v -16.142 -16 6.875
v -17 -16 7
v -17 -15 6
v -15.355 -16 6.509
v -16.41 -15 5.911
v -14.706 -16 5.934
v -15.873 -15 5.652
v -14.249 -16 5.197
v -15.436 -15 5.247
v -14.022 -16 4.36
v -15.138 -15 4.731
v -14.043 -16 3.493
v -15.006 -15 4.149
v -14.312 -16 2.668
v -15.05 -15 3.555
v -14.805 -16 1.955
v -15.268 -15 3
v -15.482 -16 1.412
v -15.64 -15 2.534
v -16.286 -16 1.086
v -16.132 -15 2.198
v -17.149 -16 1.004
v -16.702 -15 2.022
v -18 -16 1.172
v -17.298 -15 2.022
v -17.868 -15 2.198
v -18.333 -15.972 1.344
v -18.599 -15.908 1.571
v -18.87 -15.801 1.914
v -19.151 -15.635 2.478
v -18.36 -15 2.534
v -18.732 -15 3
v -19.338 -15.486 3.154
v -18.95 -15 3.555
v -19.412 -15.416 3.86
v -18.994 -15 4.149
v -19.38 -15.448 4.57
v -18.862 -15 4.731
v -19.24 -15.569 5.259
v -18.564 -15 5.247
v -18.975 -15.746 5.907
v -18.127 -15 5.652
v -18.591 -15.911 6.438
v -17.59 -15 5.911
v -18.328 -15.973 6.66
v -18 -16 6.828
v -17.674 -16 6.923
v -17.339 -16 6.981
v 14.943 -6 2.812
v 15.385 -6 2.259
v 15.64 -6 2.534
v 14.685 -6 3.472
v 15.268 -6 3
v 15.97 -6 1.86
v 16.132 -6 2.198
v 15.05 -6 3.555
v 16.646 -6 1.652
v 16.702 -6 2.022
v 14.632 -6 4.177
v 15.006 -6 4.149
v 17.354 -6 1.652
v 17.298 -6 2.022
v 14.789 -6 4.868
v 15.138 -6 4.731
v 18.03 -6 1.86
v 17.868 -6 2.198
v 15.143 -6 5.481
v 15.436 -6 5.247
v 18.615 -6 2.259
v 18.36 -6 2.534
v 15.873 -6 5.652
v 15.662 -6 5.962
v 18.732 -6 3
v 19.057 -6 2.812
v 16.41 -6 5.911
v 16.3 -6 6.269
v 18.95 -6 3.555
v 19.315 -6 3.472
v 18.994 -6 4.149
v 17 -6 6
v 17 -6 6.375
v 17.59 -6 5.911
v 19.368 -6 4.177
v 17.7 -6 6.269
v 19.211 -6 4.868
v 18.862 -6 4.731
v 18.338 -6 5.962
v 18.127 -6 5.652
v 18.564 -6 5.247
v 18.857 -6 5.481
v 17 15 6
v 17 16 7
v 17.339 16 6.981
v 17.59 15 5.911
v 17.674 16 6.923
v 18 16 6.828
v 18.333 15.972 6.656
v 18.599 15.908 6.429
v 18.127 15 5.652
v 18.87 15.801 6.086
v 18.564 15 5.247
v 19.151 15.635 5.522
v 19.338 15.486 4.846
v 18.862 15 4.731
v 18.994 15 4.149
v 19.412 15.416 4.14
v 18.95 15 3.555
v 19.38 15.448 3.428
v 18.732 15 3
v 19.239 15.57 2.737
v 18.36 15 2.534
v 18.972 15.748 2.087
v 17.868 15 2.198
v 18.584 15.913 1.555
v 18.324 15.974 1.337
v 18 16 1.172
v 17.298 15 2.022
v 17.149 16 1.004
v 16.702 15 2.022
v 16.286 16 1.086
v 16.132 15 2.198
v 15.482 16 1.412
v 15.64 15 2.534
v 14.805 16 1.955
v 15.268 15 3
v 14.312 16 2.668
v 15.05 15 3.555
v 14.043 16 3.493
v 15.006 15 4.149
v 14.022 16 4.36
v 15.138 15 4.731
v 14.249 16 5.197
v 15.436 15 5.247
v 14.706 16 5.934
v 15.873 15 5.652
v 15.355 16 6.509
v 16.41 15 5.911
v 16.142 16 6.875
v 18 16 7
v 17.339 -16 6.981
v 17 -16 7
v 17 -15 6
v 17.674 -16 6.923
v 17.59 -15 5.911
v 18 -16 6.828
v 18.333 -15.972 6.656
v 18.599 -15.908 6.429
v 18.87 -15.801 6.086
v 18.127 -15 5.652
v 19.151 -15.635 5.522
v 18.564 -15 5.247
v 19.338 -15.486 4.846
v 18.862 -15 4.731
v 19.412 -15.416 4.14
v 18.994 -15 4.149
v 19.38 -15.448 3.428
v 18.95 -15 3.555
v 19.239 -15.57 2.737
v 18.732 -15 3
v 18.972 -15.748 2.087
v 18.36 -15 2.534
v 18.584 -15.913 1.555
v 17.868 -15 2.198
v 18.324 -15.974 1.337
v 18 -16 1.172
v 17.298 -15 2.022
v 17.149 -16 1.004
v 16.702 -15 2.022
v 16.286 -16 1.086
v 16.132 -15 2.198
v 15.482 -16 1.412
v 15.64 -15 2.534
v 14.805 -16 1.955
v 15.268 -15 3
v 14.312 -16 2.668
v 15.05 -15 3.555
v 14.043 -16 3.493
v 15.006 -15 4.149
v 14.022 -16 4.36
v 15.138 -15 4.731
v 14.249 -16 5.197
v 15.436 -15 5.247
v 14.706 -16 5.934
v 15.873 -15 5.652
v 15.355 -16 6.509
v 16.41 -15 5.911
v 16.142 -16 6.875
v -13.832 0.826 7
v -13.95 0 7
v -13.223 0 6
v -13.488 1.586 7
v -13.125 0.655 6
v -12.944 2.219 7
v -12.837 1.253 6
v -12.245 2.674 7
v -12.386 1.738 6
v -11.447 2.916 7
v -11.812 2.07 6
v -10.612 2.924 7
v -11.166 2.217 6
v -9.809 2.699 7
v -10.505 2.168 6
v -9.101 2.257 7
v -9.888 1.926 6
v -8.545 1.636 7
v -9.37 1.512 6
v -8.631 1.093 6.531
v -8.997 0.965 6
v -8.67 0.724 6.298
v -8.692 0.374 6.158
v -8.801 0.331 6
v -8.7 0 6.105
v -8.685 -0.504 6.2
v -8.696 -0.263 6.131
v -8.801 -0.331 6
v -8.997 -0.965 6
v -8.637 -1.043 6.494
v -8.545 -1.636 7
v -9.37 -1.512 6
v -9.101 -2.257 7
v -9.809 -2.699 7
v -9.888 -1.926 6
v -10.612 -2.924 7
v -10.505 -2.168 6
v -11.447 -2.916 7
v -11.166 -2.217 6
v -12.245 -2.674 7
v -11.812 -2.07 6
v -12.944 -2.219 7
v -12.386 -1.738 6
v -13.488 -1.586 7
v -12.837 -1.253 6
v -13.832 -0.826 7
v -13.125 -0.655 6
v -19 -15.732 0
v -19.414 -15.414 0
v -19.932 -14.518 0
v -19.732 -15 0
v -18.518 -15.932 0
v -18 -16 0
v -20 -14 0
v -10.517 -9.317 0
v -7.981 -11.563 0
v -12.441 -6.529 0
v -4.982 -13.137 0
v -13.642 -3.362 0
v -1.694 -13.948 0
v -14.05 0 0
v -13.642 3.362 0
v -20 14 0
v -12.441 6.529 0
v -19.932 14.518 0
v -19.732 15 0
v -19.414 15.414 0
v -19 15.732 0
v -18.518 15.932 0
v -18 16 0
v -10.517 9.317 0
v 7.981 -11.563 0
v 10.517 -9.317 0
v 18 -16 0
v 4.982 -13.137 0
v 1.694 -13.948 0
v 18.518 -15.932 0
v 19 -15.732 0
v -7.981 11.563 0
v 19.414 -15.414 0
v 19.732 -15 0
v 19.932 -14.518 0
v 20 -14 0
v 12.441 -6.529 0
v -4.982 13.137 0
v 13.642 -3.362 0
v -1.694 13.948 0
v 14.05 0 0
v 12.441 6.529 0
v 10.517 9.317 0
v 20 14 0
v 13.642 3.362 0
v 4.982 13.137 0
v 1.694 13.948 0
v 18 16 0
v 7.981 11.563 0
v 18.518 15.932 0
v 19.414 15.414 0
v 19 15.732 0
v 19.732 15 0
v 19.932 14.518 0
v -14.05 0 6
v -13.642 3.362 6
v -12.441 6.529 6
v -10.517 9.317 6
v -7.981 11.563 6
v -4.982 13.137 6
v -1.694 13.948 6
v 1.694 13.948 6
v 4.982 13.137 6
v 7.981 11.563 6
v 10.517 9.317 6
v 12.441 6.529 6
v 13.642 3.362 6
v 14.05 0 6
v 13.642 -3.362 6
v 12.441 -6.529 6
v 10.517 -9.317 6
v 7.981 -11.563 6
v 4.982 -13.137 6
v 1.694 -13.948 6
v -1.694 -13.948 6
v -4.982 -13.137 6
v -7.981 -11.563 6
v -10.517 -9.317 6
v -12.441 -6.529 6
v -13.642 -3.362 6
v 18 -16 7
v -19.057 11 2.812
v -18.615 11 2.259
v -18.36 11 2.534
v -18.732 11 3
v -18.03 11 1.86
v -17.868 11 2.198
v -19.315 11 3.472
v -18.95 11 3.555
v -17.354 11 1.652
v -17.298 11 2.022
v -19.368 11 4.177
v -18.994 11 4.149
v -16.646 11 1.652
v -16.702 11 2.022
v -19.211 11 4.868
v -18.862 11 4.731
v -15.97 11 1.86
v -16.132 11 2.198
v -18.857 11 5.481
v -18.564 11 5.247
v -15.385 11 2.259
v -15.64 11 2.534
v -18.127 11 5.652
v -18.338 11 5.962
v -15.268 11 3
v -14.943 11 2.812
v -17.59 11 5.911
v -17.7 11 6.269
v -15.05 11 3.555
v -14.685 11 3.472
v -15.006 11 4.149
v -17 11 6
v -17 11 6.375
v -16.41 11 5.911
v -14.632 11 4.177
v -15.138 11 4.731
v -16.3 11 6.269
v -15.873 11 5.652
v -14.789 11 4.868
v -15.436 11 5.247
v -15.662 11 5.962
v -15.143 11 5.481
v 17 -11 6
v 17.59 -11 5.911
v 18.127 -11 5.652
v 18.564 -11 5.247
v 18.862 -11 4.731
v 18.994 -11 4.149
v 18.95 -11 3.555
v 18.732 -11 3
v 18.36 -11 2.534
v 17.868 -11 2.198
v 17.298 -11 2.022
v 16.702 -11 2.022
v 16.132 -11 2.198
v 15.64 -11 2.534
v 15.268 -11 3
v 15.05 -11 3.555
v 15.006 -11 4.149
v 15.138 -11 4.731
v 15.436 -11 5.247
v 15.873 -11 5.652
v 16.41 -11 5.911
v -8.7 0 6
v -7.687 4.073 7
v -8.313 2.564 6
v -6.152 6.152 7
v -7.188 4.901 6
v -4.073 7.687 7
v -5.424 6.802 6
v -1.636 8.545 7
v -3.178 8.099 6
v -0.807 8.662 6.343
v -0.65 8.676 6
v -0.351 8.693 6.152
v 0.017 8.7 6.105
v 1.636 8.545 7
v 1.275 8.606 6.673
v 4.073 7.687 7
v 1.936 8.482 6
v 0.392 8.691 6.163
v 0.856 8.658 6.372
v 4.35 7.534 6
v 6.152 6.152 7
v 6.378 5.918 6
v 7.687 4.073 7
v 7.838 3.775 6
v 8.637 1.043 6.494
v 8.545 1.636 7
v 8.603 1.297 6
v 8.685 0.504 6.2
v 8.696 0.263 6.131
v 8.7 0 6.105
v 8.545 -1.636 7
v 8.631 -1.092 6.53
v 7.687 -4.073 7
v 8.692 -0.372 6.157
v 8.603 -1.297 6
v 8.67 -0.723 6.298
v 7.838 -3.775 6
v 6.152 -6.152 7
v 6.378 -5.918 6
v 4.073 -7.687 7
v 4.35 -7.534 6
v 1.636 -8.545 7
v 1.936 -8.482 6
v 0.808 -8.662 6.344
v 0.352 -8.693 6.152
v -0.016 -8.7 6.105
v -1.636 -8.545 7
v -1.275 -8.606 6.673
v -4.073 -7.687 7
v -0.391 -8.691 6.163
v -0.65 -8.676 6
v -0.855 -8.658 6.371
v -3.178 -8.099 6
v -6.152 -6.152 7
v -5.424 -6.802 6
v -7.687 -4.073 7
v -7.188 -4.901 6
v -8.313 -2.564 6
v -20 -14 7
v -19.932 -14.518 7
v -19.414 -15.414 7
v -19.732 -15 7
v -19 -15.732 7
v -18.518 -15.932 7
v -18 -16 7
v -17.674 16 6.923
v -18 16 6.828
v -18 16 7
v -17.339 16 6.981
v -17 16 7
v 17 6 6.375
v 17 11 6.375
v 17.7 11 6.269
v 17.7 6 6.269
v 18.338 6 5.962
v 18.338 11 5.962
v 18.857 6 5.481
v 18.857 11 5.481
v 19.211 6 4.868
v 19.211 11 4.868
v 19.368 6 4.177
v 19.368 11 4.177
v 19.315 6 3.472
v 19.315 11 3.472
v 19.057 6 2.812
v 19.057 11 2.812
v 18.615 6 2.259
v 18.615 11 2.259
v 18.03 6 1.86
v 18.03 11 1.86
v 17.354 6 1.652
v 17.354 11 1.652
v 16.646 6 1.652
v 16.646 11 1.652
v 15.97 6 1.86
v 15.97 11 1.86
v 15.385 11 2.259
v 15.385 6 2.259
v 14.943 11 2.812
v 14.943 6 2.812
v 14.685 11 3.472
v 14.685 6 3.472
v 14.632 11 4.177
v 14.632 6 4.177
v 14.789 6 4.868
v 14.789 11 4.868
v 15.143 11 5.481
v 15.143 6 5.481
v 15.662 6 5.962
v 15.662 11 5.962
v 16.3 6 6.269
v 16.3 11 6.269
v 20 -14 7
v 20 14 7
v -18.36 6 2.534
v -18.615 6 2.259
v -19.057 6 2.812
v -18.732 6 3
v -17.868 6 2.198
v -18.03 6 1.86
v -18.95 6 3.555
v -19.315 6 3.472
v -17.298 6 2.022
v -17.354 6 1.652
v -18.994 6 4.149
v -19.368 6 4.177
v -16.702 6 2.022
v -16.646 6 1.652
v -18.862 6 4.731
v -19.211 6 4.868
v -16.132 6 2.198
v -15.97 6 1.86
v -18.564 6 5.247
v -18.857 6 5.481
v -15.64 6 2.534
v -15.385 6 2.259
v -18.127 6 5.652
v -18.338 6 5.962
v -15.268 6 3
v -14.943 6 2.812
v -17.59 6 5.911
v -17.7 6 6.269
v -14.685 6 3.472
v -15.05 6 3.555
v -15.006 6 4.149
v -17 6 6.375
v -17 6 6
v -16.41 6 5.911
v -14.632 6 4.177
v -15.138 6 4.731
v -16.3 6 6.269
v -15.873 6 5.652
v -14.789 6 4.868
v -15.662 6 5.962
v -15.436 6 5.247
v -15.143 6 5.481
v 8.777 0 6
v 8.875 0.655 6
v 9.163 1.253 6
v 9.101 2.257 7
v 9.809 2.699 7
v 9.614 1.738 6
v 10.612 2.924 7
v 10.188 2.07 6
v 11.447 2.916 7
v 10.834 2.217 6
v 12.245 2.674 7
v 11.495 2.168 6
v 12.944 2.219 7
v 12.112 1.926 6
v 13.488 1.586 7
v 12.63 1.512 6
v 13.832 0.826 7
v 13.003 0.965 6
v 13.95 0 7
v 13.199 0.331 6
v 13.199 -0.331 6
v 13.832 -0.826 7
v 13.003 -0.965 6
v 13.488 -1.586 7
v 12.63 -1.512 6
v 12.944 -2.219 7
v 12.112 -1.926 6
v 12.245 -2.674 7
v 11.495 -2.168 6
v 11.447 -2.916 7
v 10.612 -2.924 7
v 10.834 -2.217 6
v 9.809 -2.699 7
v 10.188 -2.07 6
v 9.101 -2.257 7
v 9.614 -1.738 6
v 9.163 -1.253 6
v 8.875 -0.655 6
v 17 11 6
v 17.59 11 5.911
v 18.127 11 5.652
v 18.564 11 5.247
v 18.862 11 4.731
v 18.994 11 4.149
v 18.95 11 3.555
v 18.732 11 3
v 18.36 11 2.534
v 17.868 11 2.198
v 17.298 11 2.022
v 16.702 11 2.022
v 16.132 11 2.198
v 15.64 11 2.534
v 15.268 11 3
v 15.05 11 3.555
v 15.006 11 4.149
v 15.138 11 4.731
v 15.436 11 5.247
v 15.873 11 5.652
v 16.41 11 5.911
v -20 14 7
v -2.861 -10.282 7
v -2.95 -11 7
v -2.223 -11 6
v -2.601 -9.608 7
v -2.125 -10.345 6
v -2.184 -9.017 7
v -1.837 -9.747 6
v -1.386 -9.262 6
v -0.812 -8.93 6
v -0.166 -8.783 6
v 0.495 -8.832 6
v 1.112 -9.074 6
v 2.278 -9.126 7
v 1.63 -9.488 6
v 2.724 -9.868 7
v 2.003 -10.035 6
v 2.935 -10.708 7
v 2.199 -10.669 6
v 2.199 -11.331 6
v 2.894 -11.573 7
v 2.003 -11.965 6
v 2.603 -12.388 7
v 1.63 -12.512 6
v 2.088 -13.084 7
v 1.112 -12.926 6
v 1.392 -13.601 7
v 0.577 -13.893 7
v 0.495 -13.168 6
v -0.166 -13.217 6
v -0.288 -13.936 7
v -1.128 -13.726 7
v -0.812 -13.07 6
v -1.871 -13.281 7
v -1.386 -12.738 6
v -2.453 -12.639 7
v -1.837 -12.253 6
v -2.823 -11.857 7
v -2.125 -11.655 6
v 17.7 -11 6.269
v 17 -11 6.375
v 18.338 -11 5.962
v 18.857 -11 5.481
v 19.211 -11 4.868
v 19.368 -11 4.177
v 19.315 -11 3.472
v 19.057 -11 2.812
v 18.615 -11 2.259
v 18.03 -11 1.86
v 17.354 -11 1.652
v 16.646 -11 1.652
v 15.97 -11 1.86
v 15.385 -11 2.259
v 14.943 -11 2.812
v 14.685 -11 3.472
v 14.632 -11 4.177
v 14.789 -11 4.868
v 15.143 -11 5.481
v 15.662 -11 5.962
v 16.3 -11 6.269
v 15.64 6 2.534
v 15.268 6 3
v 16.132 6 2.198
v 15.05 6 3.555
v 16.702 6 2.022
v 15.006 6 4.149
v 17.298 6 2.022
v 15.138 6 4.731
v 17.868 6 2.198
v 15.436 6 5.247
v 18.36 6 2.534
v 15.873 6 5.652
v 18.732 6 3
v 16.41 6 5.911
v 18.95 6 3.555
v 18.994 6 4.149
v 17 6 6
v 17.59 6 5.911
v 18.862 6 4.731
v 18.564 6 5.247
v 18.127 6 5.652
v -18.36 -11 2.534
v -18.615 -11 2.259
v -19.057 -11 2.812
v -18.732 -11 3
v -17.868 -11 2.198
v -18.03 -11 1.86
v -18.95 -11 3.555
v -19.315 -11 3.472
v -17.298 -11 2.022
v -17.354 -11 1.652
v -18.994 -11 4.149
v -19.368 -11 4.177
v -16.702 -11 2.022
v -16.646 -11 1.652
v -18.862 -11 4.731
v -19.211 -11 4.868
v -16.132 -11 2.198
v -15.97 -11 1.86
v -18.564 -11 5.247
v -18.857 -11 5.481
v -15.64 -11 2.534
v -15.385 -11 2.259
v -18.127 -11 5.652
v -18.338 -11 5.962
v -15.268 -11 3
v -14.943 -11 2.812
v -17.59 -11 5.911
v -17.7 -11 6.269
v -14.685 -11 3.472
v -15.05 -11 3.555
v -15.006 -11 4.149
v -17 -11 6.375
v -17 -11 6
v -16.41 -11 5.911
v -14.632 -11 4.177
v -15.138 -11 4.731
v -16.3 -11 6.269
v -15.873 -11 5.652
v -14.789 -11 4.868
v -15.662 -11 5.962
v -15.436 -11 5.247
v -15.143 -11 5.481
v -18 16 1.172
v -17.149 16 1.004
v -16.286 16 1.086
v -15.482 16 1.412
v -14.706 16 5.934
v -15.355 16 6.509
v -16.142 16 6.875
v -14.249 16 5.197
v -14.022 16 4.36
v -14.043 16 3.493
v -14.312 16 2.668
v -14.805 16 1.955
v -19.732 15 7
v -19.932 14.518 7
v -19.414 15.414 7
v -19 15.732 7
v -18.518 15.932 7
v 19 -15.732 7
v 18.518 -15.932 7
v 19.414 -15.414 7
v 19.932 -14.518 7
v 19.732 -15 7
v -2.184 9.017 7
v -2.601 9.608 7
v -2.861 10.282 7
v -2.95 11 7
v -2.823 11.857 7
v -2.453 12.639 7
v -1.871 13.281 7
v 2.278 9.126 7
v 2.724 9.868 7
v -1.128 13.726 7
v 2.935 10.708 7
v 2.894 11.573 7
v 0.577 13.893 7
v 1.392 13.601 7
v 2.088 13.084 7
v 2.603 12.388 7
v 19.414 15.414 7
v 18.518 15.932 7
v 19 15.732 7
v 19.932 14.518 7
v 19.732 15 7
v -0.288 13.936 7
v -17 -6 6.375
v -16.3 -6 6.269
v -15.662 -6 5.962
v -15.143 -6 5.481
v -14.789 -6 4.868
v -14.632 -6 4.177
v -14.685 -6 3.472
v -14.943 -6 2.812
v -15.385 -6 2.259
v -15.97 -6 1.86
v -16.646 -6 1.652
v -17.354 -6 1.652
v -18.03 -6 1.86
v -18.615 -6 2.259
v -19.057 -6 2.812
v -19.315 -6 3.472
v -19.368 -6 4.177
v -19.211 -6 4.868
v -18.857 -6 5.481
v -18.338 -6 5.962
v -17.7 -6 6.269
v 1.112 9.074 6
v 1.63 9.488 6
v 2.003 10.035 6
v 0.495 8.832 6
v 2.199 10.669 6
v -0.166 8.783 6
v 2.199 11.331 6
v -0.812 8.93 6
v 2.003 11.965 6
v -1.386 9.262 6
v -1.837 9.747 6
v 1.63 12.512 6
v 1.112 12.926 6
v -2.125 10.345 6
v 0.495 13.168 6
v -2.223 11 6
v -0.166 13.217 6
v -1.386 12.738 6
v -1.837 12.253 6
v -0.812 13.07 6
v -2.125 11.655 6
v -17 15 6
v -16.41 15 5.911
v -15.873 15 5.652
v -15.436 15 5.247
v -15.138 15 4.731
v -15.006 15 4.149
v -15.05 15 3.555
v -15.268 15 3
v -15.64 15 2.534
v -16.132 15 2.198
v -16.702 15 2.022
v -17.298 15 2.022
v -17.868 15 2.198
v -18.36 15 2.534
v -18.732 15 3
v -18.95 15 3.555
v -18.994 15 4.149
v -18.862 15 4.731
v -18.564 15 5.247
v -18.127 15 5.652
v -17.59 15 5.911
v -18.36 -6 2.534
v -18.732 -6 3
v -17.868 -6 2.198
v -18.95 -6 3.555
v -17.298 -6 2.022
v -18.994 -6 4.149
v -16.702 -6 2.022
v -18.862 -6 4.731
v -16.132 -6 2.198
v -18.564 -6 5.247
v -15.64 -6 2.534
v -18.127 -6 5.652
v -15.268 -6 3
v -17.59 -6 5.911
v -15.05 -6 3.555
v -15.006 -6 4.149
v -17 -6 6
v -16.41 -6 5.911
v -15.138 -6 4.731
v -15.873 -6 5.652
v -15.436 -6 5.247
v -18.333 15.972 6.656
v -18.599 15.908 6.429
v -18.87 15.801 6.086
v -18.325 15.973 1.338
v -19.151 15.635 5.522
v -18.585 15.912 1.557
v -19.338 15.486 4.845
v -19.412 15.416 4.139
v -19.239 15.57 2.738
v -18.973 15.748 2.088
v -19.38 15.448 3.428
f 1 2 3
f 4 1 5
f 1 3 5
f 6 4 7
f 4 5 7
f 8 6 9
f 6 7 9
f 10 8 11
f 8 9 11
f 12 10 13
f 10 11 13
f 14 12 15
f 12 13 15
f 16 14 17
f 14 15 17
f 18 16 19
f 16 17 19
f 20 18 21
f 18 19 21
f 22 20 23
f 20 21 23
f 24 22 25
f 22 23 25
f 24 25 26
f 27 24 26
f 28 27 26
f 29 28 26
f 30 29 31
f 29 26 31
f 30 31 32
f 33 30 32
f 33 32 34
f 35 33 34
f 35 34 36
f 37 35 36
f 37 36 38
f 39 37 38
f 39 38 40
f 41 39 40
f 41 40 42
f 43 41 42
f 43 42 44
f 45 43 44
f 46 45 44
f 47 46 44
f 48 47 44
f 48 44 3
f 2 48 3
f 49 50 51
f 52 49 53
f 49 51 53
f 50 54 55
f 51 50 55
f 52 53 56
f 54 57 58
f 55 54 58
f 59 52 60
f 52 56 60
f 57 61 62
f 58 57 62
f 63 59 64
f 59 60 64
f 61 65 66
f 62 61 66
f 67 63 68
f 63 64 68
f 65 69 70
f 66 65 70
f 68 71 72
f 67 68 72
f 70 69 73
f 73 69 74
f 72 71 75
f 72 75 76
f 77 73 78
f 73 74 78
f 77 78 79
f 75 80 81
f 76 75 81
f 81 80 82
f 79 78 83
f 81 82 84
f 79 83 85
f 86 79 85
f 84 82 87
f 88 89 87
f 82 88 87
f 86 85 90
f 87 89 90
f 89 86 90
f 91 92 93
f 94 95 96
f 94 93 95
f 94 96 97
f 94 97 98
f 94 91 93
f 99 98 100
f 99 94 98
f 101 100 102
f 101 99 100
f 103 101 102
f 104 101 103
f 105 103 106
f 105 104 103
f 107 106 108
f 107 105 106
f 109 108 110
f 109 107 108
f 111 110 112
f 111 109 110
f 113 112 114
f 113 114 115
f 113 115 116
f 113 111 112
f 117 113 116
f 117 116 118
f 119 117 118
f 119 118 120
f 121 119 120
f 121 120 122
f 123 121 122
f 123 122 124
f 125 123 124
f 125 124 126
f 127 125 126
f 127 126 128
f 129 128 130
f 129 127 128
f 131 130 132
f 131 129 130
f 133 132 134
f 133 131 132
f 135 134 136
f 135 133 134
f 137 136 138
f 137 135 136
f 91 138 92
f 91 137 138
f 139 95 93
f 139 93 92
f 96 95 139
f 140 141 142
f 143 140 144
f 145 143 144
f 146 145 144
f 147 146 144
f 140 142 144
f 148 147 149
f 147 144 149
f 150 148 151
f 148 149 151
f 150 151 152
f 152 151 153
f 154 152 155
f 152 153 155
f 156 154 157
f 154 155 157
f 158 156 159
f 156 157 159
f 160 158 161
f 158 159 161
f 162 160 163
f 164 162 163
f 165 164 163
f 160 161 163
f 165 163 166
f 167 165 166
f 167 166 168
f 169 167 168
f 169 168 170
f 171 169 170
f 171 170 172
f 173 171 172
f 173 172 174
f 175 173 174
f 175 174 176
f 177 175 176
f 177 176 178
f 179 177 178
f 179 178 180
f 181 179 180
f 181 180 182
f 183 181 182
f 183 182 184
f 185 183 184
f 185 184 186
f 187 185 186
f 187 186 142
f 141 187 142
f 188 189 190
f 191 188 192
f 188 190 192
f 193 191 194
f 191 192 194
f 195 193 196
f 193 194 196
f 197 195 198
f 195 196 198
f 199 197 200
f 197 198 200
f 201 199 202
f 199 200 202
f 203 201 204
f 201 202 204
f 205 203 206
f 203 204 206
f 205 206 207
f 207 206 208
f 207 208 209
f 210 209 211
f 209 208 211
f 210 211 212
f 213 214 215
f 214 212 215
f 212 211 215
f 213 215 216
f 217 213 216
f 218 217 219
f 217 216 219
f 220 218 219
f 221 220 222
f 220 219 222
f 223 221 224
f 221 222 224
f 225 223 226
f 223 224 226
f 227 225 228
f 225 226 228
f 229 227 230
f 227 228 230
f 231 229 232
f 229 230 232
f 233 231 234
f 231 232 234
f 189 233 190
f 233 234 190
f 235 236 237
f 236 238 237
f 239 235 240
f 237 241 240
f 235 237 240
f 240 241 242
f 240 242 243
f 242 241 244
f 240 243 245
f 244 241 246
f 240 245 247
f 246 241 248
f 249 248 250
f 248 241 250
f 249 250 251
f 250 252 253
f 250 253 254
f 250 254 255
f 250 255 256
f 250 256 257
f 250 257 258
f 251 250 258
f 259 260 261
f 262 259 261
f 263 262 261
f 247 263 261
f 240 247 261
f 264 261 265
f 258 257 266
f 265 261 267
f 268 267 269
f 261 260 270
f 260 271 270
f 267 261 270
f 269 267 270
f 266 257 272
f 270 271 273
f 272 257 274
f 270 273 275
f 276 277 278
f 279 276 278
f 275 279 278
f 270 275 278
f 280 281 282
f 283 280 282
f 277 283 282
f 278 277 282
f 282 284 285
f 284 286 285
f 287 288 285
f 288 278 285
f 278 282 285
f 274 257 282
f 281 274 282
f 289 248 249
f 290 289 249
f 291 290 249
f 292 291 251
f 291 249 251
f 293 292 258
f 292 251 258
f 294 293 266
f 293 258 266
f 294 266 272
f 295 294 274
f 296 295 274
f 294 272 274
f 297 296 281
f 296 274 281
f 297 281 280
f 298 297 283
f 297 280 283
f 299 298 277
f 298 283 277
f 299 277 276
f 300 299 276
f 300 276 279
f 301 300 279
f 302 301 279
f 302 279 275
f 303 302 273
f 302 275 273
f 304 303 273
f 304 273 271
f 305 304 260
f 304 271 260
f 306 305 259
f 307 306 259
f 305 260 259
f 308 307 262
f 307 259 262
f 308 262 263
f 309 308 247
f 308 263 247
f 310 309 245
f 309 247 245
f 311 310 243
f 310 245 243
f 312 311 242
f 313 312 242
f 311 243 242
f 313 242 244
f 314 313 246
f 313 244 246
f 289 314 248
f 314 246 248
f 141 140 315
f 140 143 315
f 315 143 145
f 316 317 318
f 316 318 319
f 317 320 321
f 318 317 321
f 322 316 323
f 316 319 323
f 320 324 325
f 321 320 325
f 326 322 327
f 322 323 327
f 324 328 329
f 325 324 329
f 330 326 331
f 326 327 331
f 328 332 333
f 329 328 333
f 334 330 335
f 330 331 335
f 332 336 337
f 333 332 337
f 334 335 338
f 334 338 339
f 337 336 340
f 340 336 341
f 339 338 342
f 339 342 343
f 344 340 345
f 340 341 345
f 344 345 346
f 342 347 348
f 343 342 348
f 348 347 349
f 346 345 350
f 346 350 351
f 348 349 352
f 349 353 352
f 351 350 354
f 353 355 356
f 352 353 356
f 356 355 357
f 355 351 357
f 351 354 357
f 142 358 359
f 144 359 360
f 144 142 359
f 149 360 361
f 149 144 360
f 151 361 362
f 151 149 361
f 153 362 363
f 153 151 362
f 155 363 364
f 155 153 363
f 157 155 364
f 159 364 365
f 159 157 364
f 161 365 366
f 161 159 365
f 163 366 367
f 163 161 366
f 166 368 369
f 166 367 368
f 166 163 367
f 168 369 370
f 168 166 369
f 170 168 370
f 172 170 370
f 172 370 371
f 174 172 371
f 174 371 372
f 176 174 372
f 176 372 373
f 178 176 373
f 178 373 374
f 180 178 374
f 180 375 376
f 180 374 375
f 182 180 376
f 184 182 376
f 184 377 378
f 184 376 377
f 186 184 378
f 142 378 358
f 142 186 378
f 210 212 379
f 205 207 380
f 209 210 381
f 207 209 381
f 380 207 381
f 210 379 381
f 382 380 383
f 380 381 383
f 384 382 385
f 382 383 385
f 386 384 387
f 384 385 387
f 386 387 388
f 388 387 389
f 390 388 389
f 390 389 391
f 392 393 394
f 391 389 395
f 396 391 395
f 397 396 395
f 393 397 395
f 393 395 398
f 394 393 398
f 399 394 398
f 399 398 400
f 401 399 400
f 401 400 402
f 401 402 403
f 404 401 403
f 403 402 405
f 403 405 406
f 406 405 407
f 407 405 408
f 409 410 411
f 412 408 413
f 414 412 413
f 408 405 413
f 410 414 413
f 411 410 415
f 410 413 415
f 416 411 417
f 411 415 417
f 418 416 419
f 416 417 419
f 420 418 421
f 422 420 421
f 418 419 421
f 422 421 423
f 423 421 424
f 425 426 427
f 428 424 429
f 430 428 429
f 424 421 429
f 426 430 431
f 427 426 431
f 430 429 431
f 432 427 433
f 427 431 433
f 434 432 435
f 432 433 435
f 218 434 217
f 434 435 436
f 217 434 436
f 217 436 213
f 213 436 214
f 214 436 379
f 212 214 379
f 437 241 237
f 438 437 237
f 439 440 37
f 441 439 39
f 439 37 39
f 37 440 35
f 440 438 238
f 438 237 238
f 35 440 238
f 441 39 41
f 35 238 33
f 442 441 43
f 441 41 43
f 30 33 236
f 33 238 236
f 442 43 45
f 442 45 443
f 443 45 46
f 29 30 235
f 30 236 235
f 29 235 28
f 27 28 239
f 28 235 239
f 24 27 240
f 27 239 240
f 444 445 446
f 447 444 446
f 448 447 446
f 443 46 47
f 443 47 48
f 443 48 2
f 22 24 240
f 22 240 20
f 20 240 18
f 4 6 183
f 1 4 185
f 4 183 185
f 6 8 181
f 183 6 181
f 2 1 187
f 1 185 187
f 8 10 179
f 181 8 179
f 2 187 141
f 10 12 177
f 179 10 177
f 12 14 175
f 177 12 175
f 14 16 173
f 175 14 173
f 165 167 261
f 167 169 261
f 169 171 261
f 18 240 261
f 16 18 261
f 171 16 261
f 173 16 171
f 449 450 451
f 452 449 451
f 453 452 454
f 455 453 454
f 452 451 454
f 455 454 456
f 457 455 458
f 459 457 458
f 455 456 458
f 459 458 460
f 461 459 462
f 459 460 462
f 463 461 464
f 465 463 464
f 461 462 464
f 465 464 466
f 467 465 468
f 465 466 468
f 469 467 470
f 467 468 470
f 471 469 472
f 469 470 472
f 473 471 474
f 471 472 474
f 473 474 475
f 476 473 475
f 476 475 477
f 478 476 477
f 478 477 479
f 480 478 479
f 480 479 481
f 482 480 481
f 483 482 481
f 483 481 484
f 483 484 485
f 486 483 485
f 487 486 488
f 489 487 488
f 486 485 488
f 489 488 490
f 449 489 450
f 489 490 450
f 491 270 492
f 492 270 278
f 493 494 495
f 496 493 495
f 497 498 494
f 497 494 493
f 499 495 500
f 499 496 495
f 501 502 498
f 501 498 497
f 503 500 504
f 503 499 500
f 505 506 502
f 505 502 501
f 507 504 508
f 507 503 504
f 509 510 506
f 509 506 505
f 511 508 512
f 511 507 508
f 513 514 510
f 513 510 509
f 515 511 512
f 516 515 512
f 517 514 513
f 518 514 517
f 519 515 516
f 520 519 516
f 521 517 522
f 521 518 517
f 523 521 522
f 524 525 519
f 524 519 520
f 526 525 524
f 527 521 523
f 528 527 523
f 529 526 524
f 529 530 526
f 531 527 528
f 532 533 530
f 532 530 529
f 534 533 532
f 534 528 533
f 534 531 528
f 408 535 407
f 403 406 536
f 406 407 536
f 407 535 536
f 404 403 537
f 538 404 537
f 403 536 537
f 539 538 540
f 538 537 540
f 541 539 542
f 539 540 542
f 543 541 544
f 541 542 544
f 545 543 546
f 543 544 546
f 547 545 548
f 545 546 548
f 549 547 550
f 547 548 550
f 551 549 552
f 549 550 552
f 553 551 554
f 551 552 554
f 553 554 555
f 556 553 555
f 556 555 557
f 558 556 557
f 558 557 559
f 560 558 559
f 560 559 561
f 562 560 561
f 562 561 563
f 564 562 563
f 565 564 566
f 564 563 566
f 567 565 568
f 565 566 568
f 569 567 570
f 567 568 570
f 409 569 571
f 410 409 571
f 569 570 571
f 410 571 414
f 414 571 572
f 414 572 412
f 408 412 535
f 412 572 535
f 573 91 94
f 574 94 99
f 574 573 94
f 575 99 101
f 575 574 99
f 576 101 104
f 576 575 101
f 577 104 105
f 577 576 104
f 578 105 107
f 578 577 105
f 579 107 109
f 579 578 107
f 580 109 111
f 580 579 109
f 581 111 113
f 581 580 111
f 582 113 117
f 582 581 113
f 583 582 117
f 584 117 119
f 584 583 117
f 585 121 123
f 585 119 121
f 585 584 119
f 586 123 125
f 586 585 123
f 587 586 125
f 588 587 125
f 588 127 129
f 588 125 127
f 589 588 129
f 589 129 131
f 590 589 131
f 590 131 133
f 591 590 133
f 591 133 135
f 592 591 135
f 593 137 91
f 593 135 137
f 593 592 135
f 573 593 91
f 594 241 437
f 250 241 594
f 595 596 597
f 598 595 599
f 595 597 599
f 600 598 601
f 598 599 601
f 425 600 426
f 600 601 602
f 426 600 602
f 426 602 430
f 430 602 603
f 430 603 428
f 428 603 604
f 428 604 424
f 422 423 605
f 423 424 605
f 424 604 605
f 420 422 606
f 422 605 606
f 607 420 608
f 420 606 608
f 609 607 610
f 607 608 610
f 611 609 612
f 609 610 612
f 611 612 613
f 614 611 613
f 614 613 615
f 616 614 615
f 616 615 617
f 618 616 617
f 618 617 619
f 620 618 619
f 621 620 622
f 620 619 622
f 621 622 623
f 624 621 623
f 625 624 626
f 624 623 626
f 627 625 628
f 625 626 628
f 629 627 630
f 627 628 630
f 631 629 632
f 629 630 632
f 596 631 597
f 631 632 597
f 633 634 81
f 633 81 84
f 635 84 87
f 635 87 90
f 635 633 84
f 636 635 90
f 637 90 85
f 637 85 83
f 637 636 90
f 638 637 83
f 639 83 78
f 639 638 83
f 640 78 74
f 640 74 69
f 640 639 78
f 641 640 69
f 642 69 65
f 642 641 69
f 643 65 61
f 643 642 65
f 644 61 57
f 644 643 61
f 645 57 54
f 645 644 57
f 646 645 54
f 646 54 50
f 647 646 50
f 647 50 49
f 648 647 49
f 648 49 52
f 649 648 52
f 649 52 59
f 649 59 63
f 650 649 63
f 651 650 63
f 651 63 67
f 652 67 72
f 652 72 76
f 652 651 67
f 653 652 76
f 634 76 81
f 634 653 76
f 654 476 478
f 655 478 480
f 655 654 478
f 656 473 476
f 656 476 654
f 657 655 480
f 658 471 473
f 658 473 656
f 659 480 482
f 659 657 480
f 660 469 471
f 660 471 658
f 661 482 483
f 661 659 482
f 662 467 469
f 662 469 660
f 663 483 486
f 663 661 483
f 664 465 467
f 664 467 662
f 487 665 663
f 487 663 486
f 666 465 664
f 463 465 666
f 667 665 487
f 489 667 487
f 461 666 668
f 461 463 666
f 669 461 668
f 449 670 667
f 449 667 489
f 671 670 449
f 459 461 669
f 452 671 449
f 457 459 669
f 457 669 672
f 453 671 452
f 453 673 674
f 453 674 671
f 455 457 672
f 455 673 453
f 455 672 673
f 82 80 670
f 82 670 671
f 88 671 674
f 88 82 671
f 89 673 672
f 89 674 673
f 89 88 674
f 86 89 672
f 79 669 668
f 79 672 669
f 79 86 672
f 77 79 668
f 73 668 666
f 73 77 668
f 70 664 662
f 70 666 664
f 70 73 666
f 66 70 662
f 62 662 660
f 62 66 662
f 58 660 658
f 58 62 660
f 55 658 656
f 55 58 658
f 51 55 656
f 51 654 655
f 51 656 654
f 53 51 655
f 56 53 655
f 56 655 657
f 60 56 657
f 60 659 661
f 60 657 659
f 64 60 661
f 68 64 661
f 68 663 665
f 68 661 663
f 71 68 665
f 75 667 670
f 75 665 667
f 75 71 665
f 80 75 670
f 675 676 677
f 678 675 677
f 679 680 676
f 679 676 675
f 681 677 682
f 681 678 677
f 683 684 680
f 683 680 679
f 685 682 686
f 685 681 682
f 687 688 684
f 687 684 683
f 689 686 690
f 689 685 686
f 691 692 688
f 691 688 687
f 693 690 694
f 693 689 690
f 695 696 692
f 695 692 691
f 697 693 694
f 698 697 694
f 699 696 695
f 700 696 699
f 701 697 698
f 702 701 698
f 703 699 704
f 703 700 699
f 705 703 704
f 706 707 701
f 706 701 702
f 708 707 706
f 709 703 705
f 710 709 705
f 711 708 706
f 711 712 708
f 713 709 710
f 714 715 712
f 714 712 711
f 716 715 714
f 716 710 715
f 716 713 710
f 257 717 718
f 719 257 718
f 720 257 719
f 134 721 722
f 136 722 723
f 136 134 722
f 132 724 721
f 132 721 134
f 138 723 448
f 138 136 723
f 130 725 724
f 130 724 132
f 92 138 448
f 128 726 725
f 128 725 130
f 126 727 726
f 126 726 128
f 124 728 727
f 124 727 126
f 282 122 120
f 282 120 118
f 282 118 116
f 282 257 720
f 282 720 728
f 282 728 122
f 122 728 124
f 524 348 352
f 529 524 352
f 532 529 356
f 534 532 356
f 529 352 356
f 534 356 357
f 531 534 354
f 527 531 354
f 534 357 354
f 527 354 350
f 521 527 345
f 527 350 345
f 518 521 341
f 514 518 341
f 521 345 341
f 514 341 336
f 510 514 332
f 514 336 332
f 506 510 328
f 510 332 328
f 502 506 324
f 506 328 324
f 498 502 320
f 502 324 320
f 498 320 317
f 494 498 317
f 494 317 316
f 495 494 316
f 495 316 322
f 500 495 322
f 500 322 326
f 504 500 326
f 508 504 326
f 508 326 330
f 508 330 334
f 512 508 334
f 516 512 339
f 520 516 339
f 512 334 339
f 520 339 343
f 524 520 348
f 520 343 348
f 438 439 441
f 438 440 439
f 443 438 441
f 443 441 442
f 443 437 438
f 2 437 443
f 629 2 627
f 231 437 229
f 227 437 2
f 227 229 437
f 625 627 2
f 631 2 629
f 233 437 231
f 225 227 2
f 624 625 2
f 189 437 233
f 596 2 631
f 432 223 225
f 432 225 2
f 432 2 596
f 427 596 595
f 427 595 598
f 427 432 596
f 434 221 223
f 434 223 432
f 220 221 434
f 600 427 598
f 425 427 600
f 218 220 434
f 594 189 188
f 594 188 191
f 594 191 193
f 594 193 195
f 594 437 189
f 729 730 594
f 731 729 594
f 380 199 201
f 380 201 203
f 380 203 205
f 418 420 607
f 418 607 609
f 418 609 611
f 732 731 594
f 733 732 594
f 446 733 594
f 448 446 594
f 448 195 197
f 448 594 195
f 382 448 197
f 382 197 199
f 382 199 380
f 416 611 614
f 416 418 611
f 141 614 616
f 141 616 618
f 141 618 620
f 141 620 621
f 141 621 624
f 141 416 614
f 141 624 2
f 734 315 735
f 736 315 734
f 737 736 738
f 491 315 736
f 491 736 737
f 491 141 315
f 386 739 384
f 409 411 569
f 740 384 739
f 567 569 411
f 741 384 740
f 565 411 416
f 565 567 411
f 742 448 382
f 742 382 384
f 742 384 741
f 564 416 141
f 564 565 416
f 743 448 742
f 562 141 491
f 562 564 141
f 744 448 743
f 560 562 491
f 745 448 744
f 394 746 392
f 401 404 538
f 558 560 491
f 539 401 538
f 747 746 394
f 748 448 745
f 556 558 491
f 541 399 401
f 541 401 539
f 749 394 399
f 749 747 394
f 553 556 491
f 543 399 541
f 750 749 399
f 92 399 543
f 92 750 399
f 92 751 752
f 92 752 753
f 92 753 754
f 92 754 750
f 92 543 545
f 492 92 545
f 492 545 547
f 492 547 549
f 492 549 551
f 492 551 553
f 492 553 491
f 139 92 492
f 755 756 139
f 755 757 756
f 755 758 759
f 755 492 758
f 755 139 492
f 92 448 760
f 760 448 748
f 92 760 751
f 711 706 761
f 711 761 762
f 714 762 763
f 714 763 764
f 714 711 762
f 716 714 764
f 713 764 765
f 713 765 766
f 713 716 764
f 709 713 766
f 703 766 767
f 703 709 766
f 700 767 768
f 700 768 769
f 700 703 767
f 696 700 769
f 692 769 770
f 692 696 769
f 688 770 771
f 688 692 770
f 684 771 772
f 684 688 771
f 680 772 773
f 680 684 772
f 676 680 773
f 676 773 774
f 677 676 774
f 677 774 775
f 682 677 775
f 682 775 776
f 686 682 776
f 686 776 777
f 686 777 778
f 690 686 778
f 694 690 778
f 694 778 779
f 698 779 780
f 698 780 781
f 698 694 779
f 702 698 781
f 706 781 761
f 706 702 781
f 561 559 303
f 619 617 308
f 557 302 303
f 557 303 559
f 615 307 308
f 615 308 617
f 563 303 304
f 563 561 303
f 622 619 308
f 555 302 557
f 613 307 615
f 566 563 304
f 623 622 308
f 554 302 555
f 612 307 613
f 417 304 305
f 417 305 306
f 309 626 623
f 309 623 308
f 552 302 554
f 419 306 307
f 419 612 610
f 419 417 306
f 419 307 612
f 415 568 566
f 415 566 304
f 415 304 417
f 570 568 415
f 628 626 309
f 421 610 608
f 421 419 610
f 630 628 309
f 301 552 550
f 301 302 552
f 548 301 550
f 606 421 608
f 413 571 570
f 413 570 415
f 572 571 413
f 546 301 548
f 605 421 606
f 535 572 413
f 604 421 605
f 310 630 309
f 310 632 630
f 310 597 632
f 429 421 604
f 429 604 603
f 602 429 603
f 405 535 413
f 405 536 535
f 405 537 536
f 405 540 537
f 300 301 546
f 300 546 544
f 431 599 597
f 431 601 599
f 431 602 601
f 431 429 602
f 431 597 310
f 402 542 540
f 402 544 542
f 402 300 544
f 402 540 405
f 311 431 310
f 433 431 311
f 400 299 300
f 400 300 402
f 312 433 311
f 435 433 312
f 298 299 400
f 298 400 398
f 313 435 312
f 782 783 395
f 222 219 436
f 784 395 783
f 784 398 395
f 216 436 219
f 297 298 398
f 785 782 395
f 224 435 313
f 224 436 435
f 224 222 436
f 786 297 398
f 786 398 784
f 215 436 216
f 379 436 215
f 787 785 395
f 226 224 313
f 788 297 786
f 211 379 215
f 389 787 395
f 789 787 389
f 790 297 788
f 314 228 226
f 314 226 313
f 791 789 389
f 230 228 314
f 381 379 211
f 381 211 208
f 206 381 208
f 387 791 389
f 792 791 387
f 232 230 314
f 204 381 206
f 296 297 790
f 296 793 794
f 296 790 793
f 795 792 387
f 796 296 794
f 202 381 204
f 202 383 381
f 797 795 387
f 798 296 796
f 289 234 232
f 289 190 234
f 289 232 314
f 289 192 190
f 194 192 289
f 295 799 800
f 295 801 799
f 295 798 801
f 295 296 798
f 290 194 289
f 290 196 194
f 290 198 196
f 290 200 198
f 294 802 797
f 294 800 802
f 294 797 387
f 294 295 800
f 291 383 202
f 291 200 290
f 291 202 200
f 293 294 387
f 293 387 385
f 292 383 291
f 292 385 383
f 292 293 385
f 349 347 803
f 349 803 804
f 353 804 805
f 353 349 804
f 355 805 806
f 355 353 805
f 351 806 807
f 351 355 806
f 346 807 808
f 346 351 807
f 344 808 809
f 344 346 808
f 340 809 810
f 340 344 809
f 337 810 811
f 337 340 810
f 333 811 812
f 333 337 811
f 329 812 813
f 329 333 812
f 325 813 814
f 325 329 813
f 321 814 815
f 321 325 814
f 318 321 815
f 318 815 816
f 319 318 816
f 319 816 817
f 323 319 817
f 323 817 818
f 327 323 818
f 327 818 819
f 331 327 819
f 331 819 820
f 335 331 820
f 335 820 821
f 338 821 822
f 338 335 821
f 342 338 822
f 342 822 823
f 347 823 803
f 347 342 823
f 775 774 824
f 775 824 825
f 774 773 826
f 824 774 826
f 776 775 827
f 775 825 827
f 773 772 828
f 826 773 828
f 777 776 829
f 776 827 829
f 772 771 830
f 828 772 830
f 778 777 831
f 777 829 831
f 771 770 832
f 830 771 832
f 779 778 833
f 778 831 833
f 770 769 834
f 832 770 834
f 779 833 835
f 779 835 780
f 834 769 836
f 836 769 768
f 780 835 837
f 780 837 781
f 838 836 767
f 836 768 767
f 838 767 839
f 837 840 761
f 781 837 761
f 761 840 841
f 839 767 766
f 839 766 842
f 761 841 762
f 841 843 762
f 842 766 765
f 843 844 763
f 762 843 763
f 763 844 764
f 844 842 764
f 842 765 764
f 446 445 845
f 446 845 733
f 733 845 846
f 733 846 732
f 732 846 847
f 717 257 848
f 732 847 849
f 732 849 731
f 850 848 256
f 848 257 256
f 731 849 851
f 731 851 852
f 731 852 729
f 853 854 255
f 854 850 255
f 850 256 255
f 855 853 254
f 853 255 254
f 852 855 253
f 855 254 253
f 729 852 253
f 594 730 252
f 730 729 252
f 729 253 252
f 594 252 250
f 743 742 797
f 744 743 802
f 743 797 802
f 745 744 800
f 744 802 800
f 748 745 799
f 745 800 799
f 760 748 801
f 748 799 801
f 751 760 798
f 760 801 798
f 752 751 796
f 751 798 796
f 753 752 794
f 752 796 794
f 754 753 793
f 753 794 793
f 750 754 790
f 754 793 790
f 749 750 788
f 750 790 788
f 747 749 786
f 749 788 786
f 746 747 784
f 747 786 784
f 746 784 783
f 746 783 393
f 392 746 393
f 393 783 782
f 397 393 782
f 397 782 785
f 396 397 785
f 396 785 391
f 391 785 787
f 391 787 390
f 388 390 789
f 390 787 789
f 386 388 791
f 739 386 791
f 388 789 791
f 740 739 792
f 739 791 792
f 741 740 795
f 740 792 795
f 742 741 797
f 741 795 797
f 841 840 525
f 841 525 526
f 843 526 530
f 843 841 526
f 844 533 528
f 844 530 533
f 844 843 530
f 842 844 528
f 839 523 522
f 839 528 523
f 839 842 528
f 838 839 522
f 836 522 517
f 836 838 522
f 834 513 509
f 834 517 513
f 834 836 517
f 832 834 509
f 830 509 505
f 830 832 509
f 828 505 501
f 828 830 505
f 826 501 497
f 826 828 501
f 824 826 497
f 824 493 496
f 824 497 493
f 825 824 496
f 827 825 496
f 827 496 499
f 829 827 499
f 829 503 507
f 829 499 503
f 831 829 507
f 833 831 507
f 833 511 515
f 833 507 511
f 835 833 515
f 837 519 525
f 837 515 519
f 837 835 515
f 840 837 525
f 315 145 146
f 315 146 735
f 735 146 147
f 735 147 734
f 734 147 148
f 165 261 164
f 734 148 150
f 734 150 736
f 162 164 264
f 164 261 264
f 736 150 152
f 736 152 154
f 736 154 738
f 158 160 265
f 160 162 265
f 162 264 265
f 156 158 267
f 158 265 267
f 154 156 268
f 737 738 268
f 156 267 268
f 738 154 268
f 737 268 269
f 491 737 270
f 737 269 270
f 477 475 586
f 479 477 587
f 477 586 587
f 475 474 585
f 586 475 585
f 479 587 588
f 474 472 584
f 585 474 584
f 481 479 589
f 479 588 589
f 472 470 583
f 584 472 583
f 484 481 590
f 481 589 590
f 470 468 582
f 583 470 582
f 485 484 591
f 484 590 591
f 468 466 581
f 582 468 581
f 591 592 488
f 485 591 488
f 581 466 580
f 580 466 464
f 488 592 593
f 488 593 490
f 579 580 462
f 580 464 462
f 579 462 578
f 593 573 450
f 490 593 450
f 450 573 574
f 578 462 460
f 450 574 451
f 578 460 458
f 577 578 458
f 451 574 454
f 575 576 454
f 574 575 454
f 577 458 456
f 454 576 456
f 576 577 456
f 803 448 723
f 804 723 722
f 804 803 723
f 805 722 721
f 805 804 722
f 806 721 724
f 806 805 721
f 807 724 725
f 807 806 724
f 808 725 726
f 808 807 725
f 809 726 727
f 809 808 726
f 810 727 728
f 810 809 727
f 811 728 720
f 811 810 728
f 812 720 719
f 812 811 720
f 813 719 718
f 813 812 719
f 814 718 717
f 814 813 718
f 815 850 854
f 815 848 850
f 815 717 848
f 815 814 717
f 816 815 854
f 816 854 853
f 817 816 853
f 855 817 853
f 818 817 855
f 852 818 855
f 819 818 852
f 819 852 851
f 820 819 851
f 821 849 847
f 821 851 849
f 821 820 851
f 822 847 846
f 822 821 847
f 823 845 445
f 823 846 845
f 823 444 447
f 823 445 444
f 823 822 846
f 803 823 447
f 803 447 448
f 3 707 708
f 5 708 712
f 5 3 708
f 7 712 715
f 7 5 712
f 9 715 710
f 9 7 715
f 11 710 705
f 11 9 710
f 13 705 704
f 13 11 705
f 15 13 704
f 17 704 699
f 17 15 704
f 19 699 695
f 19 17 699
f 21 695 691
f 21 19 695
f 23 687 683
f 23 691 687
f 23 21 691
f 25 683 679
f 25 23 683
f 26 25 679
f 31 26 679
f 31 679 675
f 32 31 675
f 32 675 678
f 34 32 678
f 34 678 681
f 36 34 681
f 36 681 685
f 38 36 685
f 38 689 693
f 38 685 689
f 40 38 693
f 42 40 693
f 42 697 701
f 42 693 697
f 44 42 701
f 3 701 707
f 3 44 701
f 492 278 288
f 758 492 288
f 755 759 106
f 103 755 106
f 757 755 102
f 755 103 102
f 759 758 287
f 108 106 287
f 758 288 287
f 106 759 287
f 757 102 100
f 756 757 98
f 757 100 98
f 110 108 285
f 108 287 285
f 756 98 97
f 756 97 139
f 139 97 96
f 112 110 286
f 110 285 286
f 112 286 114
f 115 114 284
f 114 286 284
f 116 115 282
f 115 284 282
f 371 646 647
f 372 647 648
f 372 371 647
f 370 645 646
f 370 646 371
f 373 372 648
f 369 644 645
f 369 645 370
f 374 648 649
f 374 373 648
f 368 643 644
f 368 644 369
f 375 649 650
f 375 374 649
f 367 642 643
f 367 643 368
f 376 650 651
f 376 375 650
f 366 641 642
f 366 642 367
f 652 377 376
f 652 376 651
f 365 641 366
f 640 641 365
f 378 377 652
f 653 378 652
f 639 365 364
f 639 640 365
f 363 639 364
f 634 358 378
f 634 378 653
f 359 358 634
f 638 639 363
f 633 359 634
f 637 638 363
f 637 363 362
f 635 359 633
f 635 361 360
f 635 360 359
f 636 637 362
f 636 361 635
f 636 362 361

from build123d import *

# Parameters (mm, degrees)
SKETCH1_W               = 40
SKETCH1_H               = 32
BOSS_EXTRUDE1_DEPTH     = 7
SKETCH2_R               = 14.05
CUT_EXTRUDE1_DEPTH      = 6
SKETCH3_R               = 8.7
CUT_EXTRUDE2_DEPTH      = 6
SKETCH4_R               = 1.5
CUT_EXTRUDE3_DEPTH      = 6
CHAMFER1_SIZE           = 1.45
CHAMFER1_SIZE_2         = 1.995753785
CUT_EXTRUDE4_DEPTH      = 39.379682143
CUT_EXTRUDE4_DEPTH_BACK = 39.379682143
SKETCH5_R               = 2
FILLET1_R               = 2
CUT_EXTRUDE5_START      = -5
SKETCH6_R               = 2.375
CUT_EXTRUDE5_DEPTH      = 5
CHAMFER2_SIZE           = 1


with BuildPart() as part:
    # Sketch1 → Boss-Extrude1 (new body)
    with BuildSketch(Plane.XY):
        Rectangle(SKETCH1_W, SKETCH1_H)
    extrude(amount=BOSS_EXTRUDE1_DEPTH)

    # Sketch2 → Cut-Extrude1 (cut)
    with BuildSketch(Plane(origin=(0, 0, 0), x_dir=(-1, 0, 0), z_dir=(0, 0, -1))):
        Circle(SKETCH2_R)
    extrude(amount=-CUT_EXTRUDE1_DEPTH, mode=Mode.SUBTRACT)

    # Sketch3 → Cut-Extrude2 (cut)
    with BuildSketch(Plane(origin=(0, 0, 6), x_dir=(-1, 0, 0), z_dir=(0, 0, -1))):
        Circle(SKETCH3_R)
    extrude(amount=-CUT_EXTRUDE2_DEPTH, mode=Mode.SUBTRACT)

    # Sketch4 → Cut-Extrude3 (cut)
    with BuildSketch(Plane(origin=(0, 0, 6), x_dir=(-1, 0, 0), z_dir=(0, 0, -1))):
        with Locations((0, 11)):
            Circle(SKETCH4_R)
        with Locations((11, 0)):
            Circle(SKETCH4_R)
        with Locations((0, -11)):
            Circle(SKETCH4_R)
        with Locations((-11, 0)):
            Circle(SKETCH4_R)
    extrude(amount=-CUT_EXTRUDE3_DEPTH, mode=Mode.SUBTRACT)

    # Chamfer1
    # the kernel refuses this chamfer: 1.995753785, 1.45 mm, written as the material it takes off along each edge
    with BuildSketch(Plane(origin=(0, -11, 7), x_dir=(-1, 0, 0), z_dir=(0, -1, 0))) as chamfer1_piece_1:
        Polygon((1.5 + CHAMFER1_SIZE, 0), (1.5, CHAMFER1_SIZE_2), (1.5, 0), align=None)
    revolve(axis=Axis((0, -11, 7), (0, 0, -1)), mode=Mode.SUBTRACT)
    with BuildSketch(Plane(origin=(-11, 0, 7), x_dir=(-1, 0, 0), z_dir=(0, -1, 0))) as chamfer1_piece_2:
        Polygon((1.5 + CHAMFER1_SIZE, 0), (1.5, CHAMFER1_SIZE_2), (1.5, 0), align=None)
    revolve(axis=Axis((-11, 0, 7), (0, 0, -1)), mode=Mode.SUBTRACT)
    with BuildSketch(Plane(origin=(11, 0, 7), x_dir=(-1, 0, 0), z_dir=(0, -1, 0))) as chamfer1_piece_3:
        Polygon((1.5 + CHAMFER1_SIZE, 0), (1.5, CHAMFER1_SIZE_2), (1.5, 0), align=None)
    revolve(axis=Axis((11, 0, 7), (0, 0, -1)), mode=Mode.SUBTRACT)
    with BuildSketch(Plane(origin=(0, 11, 7), x_dir=(-1, 0, 0), z_dir=(0, -1, 0))) as chamfer1_piece_4:
        Polygon((1.5 + CHAMFER1_SIZE, 0), (1.5, CHAMFER1_SIZE_2), (1.5, 0), align=None)
    revolve(axis=Axis((0, 11, 7), (0, 0, -1)), mode=Mode.SUBTRACT)

    # Sketch5 → Cut-Extrude4 (cut, two sides: drawn at the far end of the back side and taken through both)
    with BuildSketch(Plane(origin=(0, 16, 0), x_dir=(1, 0, 0), z_dir=(0, 1, 0)).offset(-CUT_EXTRUDE4_DEPTH_BACK)):
        with Locations(Location((-17, -4, 0), (0, 0, 270))):
            Circle(SKETCH5_R)
        with Locations(Location((17, -4, 0), (0, 0, 270))):
            Circle(SKETCH5_R)
    extrude(amount=CUT_EXTRUDE4_DEPTH + CUT_EXTRUDE4_DEPTH_BACK, mode=Mode.SUBTRACT)

    # Fillet1
    # the kernel refuses this fillet: 2 mm, written as the material it takes off along each edge
    with BuildSketch(Plane(origin=(20, -16, -5), x_dir=(0, 1, 0), z_dir=(0, 0, 1)), Plane(origin=(20, 16, -5), x_dir=(-1, 0, 0), z_dir=(0, 0, 1))) as fillet1_piece_1:
        with BuildLine():
            CenterArc((FILLET1_R, FILLET1_R), FILLET1_R, 180, 90)
            Line((0, FILLET1_R), (0, 0))
            Line((0, 0), (FILLET1_R, 0))
        make_face()
    extrude(amount=17, mode=Mode.SUBTRACT)
    with BuildSketch(Plane(origin=(-20, -16, -5), x_dir=(0, 1, 0), z_dir=(0, 0, 1)), Plane(origin=(-20, 16, -5), x_dir=(1, 0, 0), z_dir=(0, 0, 1))) as fillet1_piece_2:
        with BuildLine():
            CenterArc((FILLET1_R, -FILLET1_R), FILLET1_R, 90, 90)
            Line((0, -FILLET1_R), (0, 0))
            Line((0, 0), (FILLET1_R, 0))
        make_face()
    extrude(amount=17, mode=Mode.SUBTRACT)

    # Sketch6 → Cut-Extrude5 (cut)
    with BuildSketch(Plane(origin=(0, 16, 0), x_dir=(1, 0, 0), z_dir=(0, 1, 0)).offset(CUT_EXTRUDE5_START)):
        with Locations(Location((-17, -4, 0), (0, 0, 270))):
            Circle(SKETCH6_R)
        with Locations(Location((17, -4, 0), (0, 0, 270))):
            Circle(SKETCH6_R)
    cut_extrude5 = extrude(amount=-CUT_EXTRUDE5_DEPTH, mode=Mode.SUBTRACT)

    # Mirror1: Cut-Extrude5 across plane
    add(cut_extrude5.mirror(Plane.ZX), mode=Mode.SUBTRACT)

    # Chamfer2
    # the kernel refuses this chamfer: 1 mm, written as the material it takes off along each edge
    with BuildSketch(Plane(origin=(17, -16, 4), x_dir=(0.006283143965557505, 0, 0.9999802608561372), z_dir=(-0.9999802608561372, 0, 0.006283143965557505))) as chamfer2_piece_1:
        Polygon((2 + CHAMFER2_SIZE, 0), (2, CHAMFER2_SIZE), (2, 0), align=None)
    revolve(axis=Axis((17, -16, 4), (0, 1, 0)), revolution_arc=359.64, mode=Mode.SUBTRACT)
    with BuildSketch(Plane(origin=(-17, -16, 4), x_dir=(0, 0, 1), z_dir=(-1, 0, 0))) as chamfer2_piece_2:
        Polygon((2 + CHAMFER2_SIZE, 0), (2, CHAMFER2_SIZE), (2, 0), align=None)
    revolve(axis=Axis((-17, -16, 4), (0, 1, 0)), revolution_arc=359.64, mode=Mode.SUBTRACT)
    with BuildSketch(Plane(origin=(-17, 16, 4), x_dir=(0, 0, 1), z_dir=(-1, 0, 0))) as chamfer2_piece_3:
        Polygon((2 + CHAMFER2_SIZE, 0), (2, -CHAMFER2_SIZE), (2, 0), align=None)
    revolve(axis=Axis((-17, 16, 4), (0, 1, 0)), revolution_arc=359.64, mode=Mode.SUBTRACT)
    with BuildSketch(Plane(origin=(17, 16, 4), x_dir=(0.006283143965557505, 0, 0.9999802608561372), z_dir=(-0.9999802608561372, 0, 0.006283143965557505))) as chamfer2_piece_4:
        Polygon((2 + CHAMFER2_SIZE, 0), (2, -CHAMFER2_SIZE), (2, 0), align=None)
    revolve(axis=Axis((17, 16, 4), (0, 1, 0)), revolution_arc=359.64, mode=Mode.SUBTRACT)
    with BuildSketch(Plane(origin=(17, 16, 4), x_dir=(0, 0, 1), z_dir=(-1, 0, 0))) as chamfer2_piece_5:
        Polygon((2 + CHAMFER2_SIZE, 0), (2, -CHAMFER2_SIZE), (2, 0), align=None)
    revolve(axis=Axis((17, 16, 4), (0, 1, 0)), revolution_arc=251.029734773, mode=Mode.SUBTRACT)
    with BuildSketch(Plane(origin=(-17, 16, 4), x_dir=(0.9456874082674533, 0, -0.3250774151558165), z_dir=(0.3250774151558165, 0, 0.9456874082674533))) as chamfer2_piece_6:
        Polygon((2 + CHAMFER2_SIZE, 0), (2, -CHAMFER2_SIZE), (2, 0), align=None)
    revolve(axis=Axis((-17, 16, 4), (0, 1, 0)), revolution_arc=251.029734773, mode=Mode.SUBTRACT)
    with BuildSketch(Plane(origin=(-17, -16, 4), x_dir=(0.9456874082674562, 0, -0.3250774151558082), z_dir=(0.3250774151558082, 0, 0.9456874082674562))) as chamfer2_piece_7:
        Polygon((2 + CHAMFER2_SIZE, 0), (2, CHAMFER2_SIZE), (2, 0), align=None)
    revolve(axis=Axis((-17, -16, 4), (0, 1, 0)), revolution_arc=251.029734773, mode=Mode.SUBTRACT)
    with BuildSketch(Plane(origin=(17, -16, 4), x_dir=(0, 0, 1), z_dir=(-1, 0, 0))) as chamfer2_piece_8:
        Polygon((2 + CHAMFER2_SIZE, 0), (2, CHAMFER2_SIZE), (2, 0), align=None)
    revolve(axis=Axis((17, -16, 4), (0, 1, 0)), revolution_arc=251.029734773, mode=Mode.SUBTRACT)


solid = part.part
